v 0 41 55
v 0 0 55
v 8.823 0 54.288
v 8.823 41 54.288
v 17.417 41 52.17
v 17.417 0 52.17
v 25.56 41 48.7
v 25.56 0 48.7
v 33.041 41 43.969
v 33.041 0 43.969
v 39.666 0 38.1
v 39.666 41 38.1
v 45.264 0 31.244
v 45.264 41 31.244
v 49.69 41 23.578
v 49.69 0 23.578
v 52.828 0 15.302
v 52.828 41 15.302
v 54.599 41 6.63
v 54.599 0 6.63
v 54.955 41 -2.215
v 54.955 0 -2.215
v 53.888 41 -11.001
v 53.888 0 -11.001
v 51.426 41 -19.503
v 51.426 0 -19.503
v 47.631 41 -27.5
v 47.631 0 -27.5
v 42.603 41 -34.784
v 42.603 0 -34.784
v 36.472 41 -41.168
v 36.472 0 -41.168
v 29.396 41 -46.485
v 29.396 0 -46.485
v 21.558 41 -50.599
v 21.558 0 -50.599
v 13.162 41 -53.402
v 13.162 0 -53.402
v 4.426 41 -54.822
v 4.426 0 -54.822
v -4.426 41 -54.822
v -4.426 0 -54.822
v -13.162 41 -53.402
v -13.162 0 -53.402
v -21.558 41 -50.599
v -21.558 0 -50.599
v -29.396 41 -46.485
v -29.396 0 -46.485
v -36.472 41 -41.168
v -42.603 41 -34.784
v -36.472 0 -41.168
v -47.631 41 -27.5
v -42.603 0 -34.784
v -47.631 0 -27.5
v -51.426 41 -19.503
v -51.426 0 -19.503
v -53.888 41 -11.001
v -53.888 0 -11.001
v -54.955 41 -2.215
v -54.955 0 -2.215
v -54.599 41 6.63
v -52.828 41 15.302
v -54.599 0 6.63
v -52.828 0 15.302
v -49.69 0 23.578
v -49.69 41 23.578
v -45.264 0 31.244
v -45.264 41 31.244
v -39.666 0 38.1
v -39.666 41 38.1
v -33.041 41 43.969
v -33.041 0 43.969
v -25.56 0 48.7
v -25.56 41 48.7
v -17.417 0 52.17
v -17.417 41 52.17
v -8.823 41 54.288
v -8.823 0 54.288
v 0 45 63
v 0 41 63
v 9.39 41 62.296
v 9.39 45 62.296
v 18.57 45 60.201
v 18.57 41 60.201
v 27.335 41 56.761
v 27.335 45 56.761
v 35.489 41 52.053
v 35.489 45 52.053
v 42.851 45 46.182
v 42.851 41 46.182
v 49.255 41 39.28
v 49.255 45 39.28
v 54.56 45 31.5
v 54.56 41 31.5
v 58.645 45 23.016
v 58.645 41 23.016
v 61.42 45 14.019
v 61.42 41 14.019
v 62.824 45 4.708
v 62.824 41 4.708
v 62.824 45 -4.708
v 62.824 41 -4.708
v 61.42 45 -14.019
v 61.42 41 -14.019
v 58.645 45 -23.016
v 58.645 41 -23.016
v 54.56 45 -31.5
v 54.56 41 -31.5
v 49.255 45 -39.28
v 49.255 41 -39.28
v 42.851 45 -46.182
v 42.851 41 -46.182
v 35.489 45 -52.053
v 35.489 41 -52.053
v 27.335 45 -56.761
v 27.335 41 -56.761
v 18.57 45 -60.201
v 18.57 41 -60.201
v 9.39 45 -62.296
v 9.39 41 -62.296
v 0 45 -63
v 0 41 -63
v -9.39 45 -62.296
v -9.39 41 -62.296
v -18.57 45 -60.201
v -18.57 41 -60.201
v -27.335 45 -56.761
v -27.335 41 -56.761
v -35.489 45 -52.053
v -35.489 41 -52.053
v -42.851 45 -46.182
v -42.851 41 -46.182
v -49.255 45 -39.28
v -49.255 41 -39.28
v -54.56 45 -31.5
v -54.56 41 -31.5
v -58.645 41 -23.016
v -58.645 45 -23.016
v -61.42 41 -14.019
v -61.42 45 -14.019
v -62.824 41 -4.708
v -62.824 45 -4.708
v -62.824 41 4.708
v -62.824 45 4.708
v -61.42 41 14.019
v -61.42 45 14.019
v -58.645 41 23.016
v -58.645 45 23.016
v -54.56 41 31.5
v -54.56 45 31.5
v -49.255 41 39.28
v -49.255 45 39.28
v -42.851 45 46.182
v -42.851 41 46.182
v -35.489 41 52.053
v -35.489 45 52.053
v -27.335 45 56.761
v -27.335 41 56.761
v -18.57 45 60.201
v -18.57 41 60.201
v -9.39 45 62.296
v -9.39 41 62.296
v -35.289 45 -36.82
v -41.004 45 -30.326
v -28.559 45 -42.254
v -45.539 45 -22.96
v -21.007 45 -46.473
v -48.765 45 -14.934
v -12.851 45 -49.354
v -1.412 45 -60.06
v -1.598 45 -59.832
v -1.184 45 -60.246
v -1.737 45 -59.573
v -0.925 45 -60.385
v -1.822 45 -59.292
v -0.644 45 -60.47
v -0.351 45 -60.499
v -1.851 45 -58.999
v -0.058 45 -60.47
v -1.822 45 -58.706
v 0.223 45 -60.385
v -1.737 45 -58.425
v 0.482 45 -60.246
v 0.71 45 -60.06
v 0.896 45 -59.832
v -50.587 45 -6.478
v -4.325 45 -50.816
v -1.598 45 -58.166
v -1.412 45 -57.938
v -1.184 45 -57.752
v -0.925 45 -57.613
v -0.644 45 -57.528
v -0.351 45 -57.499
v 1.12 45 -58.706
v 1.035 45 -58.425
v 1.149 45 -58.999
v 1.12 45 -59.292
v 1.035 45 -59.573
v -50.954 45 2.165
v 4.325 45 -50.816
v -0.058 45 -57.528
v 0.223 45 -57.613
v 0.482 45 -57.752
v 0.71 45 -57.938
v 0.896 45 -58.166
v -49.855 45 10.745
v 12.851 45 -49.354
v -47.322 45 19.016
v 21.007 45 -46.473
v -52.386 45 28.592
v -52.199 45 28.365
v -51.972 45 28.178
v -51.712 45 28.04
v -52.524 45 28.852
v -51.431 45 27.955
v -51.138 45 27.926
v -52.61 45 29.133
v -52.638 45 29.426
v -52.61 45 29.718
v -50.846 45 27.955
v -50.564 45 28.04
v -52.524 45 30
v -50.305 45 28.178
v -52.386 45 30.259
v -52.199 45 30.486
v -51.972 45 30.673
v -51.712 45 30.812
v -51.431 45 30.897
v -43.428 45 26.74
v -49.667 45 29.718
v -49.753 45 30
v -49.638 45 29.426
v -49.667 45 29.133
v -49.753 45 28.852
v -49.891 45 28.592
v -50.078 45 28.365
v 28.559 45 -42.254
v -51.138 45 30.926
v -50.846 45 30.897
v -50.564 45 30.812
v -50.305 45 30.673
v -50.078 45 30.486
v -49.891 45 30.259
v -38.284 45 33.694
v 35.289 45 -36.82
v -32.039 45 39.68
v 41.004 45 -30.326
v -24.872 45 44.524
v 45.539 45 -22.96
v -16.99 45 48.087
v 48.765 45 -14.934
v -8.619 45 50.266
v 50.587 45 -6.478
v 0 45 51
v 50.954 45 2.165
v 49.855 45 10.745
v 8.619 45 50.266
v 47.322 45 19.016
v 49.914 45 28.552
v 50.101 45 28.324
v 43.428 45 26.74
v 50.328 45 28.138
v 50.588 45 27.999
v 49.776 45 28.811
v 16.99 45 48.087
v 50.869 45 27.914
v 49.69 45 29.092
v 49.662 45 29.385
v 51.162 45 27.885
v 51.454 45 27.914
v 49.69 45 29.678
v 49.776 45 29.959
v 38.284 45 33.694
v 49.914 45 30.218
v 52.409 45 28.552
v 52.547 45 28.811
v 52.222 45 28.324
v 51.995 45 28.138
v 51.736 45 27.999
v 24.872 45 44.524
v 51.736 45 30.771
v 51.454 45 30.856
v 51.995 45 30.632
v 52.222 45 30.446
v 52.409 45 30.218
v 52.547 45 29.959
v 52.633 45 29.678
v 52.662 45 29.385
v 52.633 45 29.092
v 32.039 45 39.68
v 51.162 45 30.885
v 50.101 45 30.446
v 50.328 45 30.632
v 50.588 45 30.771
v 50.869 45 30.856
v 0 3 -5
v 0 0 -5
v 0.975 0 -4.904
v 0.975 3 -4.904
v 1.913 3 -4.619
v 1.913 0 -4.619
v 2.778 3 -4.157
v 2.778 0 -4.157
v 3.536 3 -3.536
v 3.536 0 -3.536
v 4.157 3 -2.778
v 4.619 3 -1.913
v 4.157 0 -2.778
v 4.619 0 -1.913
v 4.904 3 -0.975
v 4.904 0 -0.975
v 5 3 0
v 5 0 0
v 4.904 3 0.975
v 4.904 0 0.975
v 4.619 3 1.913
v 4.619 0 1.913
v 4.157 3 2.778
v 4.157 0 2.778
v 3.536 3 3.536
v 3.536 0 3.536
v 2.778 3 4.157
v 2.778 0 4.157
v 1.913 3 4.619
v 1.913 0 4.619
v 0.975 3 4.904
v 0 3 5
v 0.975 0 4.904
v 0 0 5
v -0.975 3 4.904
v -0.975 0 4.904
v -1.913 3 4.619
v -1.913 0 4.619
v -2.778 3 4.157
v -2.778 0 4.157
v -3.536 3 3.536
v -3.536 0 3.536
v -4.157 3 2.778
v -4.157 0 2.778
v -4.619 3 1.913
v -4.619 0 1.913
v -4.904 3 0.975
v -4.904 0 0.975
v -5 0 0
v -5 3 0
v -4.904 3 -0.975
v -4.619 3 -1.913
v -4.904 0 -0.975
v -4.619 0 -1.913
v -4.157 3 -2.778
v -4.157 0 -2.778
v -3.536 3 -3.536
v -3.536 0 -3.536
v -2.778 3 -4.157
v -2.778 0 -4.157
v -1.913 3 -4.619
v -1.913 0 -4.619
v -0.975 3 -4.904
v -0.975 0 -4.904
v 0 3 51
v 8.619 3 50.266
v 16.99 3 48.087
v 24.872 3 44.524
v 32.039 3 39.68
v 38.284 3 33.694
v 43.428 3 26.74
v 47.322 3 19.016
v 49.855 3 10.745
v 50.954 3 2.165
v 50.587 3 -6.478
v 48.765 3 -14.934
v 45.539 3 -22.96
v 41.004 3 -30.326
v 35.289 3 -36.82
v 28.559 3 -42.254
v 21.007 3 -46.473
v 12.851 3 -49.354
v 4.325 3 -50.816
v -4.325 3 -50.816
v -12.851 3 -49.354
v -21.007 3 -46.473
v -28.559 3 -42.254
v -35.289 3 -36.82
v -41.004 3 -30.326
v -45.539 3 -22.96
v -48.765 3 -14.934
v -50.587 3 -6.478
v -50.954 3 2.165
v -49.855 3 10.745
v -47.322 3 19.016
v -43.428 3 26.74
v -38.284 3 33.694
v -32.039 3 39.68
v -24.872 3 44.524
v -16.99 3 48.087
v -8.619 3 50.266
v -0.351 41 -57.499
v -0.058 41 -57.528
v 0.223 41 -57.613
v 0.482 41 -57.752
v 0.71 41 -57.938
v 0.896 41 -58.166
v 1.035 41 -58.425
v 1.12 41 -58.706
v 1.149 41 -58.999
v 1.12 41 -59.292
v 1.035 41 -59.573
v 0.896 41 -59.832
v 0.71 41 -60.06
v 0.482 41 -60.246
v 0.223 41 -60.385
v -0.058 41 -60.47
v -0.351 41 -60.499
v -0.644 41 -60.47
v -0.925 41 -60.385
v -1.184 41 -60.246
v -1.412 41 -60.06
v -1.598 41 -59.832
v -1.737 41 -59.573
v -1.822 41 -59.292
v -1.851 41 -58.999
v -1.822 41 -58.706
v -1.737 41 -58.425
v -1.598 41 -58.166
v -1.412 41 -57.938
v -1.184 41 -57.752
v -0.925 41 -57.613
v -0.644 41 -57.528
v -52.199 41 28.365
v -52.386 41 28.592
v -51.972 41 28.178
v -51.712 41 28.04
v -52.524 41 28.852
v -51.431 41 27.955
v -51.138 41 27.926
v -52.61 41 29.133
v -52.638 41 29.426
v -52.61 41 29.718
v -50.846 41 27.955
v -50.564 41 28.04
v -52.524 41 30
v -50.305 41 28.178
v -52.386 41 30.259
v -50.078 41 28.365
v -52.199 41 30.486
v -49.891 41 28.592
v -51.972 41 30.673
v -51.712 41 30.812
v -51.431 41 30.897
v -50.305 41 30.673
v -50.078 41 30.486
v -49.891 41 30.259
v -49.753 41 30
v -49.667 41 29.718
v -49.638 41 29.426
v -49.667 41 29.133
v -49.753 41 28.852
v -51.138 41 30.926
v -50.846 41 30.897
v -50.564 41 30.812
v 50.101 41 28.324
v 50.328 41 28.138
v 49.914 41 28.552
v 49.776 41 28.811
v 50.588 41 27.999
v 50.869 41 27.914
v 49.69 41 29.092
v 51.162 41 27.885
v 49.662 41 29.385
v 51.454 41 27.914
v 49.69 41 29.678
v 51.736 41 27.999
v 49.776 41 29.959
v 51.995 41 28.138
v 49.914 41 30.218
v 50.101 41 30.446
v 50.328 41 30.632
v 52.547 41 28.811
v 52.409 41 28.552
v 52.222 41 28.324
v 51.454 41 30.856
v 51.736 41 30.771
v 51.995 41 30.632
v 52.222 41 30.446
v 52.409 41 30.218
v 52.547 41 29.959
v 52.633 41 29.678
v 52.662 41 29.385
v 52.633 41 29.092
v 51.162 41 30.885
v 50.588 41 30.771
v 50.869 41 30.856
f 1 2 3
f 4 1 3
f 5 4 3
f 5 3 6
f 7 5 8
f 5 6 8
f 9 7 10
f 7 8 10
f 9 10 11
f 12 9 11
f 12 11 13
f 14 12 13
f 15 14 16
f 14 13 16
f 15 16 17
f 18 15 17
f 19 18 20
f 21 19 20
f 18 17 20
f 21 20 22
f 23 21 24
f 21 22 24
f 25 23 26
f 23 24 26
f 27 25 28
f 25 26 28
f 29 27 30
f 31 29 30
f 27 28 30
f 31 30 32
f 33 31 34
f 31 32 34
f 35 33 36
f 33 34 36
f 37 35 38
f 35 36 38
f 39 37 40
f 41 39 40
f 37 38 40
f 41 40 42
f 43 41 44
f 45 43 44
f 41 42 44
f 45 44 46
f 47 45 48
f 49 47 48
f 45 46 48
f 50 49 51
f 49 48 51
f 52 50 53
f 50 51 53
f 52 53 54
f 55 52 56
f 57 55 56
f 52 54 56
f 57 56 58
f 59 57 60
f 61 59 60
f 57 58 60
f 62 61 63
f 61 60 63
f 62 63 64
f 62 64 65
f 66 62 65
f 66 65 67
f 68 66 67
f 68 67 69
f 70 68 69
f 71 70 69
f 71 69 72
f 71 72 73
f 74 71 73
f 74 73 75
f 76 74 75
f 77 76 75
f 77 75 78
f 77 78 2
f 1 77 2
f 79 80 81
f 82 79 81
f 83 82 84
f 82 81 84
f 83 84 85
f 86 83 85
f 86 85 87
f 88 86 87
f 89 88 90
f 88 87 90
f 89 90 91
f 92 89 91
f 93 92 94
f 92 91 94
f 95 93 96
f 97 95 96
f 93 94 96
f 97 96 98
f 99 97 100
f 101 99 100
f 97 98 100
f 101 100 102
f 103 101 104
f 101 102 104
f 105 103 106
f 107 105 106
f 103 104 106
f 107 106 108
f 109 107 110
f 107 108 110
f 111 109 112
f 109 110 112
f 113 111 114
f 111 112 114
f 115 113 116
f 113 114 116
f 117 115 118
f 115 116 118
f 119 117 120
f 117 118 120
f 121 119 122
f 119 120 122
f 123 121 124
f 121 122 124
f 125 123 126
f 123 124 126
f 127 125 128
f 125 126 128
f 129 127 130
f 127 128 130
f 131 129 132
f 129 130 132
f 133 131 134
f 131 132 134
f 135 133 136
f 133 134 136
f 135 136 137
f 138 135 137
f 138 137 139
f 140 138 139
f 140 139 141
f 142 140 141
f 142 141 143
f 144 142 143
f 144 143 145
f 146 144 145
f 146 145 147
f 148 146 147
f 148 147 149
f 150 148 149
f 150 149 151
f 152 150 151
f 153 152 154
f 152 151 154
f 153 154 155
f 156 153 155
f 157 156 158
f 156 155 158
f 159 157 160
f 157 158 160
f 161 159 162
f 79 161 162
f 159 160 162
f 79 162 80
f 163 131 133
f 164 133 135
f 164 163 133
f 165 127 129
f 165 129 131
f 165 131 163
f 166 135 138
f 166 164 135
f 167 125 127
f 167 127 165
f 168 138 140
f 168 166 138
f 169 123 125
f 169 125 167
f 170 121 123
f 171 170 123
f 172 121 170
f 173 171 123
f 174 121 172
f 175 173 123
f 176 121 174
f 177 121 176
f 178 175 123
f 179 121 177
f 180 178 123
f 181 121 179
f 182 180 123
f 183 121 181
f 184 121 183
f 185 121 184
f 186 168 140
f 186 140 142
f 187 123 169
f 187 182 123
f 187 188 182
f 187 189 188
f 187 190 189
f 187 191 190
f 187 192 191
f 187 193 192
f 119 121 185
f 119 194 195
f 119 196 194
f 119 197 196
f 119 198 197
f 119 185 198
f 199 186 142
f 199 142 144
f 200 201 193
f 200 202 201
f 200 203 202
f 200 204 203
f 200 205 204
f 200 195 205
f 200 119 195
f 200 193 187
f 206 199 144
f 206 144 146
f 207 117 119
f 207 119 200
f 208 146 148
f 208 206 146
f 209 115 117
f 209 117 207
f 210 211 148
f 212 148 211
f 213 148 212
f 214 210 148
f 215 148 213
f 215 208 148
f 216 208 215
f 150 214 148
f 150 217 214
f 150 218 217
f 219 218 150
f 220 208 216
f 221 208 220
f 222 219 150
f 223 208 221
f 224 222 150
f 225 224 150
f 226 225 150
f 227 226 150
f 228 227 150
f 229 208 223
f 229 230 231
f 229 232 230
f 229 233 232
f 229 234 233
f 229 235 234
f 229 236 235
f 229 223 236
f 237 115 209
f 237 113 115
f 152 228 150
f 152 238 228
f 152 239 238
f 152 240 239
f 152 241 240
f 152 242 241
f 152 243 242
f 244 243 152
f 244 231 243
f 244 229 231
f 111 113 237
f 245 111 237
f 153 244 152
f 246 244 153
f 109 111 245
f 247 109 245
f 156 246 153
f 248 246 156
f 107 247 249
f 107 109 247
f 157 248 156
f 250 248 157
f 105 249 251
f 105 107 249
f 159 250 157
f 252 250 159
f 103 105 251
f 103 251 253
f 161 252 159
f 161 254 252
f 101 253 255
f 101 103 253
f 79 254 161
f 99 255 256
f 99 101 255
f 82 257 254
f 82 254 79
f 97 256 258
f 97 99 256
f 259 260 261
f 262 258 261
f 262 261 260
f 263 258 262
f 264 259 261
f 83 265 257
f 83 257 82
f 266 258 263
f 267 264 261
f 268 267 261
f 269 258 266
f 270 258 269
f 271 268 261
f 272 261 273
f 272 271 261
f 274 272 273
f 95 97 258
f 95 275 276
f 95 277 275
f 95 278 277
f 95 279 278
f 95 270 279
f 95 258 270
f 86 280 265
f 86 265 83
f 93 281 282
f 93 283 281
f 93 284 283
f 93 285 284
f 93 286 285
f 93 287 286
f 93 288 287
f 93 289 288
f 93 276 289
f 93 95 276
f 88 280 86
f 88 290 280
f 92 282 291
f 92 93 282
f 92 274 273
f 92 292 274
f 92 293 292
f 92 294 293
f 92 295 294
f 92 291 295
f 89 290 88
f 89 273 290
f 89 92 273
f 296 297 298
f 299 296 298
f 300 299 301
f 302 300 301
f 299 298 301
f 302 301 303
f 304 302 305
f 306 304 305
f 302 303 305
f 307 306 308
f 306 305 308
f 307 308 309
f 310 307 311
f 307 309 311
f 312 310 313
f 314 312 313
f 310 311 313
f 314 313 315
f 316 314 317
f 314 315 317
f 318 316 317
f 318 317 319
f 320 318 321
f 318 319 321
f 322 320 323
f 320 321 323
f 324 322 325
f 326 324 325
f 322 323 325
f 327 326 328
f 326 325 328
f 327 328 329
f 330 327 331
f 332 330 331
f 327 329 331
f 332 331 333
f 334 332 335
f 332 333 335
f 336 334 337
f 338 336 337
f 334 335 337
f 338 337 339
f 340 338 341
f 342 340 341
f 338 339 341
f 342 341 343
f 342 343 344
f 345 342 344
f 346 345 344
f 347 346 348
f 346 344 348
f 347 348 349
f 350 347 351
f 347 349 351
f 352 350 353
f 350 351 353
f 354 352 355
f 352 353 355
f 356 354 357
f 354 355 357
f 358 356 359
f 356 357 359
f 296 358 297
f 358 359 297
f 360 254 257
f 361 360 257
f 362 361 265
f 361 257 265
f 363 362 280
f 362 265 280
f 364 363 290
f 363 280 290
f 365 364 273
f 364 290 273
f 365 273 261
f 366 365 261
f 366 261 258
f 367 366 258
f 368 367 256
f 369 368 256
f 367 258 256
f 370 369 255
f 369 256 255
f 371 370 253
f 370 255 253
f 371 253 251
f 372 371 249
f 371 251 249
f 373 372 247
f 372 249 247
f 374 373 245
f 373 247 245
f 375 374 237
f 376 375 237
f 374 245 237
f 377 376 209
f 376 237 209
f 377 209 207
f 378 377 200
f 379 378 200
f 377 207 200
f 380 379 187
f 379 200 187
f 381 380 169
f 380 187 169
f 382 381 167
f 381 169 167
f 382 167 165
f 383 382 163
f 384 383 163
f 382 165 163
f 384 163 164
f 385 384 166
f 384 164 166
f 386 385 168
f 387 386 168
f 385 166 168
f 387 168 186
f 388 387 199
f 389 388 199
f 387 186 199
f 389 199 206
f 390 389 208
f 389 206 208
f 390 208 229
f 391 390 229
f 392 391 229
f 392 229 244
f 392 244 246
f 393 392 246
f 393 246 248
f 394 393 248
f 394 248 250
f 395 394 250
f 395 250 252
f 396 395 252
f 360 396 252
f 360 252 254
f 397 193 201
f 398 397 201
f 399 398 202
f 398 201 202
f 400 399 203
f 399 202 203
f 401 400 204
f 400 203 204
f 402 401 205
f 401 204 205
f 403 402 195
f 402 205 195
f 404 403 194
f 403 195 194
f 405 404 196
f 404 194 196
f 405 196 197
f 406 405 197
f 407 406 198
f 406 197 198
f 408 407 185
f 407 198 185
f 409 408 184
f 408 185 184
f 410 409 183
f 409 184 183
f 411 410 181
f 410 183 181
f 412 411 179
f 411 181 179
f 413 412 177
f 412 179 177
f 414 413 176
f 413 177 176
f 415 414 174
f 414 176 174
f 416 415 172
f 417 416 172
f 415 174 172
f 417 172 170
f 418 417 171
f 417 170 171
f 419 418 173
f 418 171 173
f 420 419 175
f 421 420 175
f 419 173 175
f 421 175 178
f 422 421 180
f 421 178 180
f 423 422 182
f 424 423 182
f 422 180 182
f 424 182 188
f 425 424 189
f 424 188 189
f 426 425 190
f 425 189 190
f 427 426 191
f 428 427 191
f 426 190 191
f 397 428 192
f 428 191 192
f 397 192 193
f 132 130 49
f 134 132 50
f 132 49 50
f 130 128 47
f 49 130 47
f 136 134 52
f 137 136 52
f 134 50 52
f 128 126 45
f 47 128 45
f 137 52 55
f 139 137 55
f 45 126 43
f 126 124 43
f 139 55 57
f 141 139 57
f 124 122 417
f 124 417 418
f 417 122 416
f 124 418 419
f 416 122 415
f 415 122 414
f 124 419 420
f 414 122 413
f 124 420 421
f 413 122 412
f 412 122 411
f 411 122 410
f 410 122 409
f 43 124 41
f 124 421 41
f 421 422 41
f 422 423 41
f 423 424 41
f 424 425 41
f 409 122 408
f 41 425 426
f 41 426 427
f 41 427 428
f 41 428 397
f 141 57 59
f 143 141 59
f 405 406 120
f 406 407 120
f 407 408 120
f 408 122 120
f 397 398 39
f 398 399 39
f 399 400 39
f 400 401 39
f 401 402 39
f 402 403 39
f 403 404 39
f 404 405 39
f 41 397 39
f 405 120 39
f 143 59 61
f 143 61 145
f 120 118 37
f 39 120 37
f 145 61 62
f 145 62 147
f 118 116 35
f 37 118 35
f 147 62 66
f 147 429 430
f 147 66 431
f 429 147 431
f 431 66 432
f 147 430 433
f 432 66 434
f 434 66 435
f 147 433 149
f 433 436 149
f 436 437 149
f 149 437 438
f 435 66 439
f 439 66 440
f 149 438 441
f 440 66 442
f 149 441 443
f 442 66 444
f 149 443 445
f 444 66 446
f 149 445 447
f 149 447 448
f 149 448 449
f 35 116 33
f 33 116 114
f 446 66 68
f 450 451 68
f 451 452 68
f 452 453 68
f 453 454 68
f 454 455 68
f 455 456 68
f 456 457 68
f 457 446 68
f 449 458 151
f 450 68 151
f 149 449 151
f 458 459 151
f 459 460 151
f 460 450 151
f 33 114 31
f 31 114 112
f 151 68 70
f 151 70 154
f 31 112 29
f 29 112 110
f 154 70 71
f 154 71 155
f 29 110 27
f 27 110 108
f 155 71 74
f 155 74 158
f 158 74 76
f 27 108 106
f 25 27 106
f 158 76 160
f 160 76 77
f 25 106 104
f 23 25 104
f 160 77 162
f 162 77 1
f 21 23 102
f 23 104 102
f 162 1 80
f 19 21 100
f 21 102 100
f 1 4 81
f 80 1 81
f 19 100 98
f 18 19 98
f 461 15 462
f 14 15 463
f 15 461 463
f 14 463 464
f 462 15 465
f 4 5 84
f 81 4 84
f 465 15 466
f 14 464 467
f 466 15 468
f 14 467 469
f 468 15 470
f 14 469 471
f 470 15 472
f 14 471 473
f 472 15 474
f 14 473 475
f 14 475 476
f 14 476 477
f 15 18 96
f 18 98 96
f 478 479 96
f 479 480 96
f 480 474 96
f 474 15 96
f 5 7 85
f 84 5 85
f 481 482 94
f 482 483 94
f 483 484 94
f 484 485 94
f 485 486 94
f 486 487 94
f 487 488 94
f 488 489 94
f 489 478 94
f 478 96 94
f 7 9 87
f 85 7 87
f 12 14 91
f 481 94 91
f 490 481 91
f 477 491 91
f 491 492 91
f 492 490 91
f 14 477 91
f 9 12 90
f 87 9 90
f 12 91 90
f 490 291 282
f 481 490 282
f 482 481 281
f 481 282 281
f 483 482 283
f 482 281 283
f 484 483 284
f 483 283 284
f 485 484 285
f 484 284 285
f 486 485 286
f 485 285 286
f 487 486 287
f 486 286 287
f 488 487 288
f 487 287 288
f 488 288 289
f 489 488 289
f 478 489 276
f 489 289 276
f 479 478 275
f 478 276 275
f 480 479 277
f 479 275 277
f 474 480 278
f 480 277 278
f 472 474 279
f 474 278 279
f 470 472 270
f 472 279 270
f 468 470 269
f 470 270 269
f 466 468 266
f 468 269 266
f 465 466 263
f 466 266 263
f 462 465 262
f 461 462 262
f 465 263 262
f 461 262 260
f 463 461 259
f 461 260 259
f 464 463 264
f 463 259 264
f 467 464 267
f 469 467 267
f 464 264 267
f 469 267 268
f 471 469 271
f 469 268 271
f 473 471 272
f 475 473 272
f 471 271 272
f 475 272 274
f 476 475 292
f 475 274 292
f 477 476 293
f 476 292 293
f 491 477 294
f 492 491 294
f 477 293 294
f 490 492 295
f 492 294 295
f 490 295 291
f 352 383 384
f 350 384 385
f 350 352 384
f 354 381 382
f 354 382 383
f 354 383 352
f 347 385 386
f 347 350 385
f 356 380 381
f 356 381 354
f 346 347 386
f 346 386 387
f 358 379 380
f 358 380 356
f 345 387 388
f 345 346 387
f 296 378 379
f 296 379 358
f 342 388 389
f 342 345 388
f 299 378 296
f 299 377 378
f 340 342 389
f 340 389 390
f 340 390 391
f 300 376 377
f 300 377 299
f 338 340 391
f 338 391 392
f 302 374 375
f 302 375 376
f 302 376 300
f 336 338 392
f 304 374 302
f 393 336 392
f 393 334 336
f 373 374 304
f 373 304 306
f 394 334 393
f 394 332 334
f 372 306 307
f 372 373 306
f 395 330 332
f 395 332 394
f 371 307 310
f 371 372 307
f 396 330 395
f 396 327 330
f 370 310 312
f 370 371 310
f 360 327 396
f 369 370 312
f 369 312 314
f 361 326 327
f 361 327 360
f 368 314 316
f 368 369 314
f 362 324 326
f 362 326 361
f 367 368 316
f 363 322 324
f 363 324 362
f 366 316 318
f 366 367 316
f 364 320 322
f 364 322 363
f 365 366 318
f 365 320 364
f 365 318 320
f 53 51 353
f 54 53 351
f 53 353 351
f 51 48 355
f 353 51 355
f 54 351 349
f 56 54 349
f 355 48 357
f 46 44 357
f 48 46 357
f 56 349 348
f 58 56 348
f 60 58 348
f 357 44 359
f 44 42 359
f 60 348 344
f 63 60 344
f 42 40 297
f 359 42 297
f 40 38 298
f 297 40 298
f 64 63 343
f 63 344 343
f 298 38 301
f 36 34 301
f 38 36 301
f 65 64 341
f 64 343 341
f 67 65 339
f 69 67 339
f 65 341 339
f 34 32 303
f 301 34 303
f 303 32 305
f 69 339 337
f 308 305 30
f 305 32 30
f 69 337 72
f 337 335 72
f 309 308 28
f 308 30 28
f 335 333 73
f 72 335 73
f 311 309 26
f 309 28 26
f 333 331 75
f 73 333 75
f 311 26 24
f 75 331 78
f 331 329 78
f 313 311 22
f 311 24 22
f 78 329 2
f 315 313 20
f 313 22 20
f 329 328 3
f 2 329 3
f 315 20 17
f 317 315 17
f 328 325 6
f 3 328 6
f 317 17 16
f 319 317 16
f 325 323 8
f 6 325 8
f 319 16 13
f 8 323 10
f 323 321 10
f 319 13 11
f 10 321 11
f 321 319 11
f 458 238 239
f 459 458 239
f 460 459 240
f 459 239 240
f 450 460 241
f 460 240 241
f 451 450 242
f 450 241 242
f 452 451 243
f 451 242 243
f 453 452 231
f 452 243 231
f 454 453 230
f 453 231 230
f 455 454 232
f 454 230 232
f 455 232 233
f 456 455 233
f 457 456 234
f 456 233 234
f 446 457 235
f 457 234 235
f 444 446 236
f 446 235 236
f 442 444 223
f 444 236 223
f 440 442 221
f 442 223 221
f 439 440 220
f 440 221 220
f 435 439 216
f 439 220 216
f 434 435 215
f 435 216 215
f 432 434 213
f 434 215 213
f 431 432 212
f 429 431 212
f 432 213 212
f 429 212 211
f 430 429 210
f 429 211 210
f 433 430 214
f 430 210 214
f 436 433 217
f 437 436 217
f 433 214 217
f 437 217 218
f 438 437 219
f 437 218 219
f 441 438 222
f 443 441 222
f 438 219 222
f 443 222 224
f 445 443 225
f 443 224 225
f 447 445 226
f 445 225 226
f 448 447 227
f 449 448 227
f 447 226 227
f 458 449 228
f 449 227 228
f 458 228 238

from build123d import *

# Parameters (mm, degrees)
SKETCH1_R           = 55
BOSS_EXTRUDE1_DEPTH = 41
SKETCH2_R           = 63
BOSS_EXTRUDE2_DEPTH = 4
SKETCH3_R           = 51
CUT_EXTRUDE3_DEPTH  = 42
SKETCH4_R           = 5
CUT_EXTRUDE4_DEPTH  = 3
SKETCH5_R           = 1.5
CUT_EXTRUDE5_DEPTH  = 4


with BuildPart() as part:
    # Sketch1 → Boss-Extrude1 (new body)
    with BuildSketch(Plane(origin=(0, 0, 0), x_dir=(1, 0, 0), z_dir=(0, 1, 0))):
        with Locations(Location((0, 0, 0), (0, 0, 270))):
            Circle(SKETCH1_R)
    extrude(amount=BOSS_EXTRUDE1_DEPTH)

    # Sketch2 → Boss-Extrude2 (add)
    with BuildSketch(Plane(origin=(0, 41, 0), x_dir=(1, 0, 0), z_dir=(0, 1, 0))):
        with Locations(Location((0, 0, 0), (0, 0, 270))):
            Circle(SKETCH2_R)
    extrude(amount=BOSS_EXTRUDE2_DEPTH)

    # Sketch3 → Cut-Extrude3 (cut)
    with BuildSketch(Plane(origin=(0, 45, 0), x_dir=(1, 0, 0), z_dir=(0, 1, 0))):
        with Locations(Location((0, 0, 0), (0, 0, 270))):
            Circle(SKETCH3_R)
    extrude(amount=-CUT_EXTRUDE3_DEPTH, mode=Mode.SUBTRACT)

    # Sketch4 → Cut-Extrude4 (cut)
    with BuildSketch(Plane.XZ):
        with Locations(Location((0, 0, 0), (0, 0, 270))):
            Circle(SKETCH4_R)
    extrude(amount=-CUT_EXTRUDE4_DEPTH, mode=Mode.SUBTRACT)

    # Sketch5 → Cut-Extrude5 (cut)
    with BuildSketch(Plane(origin=(0, 45, 0), x_dir=(1, 0, 0), z_dir=(0, 1, 0))):
        with Locations(Location((-0.350950897, 58.998956207, 0), (0, 0, 270))):
            Circle(SKETCH5_R)
        with Locations(Location((-51.138331167, -29.42568751, 0), (0, 0, 270))):
            Circle(SKETCH5_R)
        with Locations(Location((51.161668833, -29.385092176, 0), (0, 0, 270))):
            Circle(SKETCH5_R)
    extrude(amount=-CUT_EXTRUDE5_DEPTH, mode=Mode.SUBTRACT)


solid = part.part
